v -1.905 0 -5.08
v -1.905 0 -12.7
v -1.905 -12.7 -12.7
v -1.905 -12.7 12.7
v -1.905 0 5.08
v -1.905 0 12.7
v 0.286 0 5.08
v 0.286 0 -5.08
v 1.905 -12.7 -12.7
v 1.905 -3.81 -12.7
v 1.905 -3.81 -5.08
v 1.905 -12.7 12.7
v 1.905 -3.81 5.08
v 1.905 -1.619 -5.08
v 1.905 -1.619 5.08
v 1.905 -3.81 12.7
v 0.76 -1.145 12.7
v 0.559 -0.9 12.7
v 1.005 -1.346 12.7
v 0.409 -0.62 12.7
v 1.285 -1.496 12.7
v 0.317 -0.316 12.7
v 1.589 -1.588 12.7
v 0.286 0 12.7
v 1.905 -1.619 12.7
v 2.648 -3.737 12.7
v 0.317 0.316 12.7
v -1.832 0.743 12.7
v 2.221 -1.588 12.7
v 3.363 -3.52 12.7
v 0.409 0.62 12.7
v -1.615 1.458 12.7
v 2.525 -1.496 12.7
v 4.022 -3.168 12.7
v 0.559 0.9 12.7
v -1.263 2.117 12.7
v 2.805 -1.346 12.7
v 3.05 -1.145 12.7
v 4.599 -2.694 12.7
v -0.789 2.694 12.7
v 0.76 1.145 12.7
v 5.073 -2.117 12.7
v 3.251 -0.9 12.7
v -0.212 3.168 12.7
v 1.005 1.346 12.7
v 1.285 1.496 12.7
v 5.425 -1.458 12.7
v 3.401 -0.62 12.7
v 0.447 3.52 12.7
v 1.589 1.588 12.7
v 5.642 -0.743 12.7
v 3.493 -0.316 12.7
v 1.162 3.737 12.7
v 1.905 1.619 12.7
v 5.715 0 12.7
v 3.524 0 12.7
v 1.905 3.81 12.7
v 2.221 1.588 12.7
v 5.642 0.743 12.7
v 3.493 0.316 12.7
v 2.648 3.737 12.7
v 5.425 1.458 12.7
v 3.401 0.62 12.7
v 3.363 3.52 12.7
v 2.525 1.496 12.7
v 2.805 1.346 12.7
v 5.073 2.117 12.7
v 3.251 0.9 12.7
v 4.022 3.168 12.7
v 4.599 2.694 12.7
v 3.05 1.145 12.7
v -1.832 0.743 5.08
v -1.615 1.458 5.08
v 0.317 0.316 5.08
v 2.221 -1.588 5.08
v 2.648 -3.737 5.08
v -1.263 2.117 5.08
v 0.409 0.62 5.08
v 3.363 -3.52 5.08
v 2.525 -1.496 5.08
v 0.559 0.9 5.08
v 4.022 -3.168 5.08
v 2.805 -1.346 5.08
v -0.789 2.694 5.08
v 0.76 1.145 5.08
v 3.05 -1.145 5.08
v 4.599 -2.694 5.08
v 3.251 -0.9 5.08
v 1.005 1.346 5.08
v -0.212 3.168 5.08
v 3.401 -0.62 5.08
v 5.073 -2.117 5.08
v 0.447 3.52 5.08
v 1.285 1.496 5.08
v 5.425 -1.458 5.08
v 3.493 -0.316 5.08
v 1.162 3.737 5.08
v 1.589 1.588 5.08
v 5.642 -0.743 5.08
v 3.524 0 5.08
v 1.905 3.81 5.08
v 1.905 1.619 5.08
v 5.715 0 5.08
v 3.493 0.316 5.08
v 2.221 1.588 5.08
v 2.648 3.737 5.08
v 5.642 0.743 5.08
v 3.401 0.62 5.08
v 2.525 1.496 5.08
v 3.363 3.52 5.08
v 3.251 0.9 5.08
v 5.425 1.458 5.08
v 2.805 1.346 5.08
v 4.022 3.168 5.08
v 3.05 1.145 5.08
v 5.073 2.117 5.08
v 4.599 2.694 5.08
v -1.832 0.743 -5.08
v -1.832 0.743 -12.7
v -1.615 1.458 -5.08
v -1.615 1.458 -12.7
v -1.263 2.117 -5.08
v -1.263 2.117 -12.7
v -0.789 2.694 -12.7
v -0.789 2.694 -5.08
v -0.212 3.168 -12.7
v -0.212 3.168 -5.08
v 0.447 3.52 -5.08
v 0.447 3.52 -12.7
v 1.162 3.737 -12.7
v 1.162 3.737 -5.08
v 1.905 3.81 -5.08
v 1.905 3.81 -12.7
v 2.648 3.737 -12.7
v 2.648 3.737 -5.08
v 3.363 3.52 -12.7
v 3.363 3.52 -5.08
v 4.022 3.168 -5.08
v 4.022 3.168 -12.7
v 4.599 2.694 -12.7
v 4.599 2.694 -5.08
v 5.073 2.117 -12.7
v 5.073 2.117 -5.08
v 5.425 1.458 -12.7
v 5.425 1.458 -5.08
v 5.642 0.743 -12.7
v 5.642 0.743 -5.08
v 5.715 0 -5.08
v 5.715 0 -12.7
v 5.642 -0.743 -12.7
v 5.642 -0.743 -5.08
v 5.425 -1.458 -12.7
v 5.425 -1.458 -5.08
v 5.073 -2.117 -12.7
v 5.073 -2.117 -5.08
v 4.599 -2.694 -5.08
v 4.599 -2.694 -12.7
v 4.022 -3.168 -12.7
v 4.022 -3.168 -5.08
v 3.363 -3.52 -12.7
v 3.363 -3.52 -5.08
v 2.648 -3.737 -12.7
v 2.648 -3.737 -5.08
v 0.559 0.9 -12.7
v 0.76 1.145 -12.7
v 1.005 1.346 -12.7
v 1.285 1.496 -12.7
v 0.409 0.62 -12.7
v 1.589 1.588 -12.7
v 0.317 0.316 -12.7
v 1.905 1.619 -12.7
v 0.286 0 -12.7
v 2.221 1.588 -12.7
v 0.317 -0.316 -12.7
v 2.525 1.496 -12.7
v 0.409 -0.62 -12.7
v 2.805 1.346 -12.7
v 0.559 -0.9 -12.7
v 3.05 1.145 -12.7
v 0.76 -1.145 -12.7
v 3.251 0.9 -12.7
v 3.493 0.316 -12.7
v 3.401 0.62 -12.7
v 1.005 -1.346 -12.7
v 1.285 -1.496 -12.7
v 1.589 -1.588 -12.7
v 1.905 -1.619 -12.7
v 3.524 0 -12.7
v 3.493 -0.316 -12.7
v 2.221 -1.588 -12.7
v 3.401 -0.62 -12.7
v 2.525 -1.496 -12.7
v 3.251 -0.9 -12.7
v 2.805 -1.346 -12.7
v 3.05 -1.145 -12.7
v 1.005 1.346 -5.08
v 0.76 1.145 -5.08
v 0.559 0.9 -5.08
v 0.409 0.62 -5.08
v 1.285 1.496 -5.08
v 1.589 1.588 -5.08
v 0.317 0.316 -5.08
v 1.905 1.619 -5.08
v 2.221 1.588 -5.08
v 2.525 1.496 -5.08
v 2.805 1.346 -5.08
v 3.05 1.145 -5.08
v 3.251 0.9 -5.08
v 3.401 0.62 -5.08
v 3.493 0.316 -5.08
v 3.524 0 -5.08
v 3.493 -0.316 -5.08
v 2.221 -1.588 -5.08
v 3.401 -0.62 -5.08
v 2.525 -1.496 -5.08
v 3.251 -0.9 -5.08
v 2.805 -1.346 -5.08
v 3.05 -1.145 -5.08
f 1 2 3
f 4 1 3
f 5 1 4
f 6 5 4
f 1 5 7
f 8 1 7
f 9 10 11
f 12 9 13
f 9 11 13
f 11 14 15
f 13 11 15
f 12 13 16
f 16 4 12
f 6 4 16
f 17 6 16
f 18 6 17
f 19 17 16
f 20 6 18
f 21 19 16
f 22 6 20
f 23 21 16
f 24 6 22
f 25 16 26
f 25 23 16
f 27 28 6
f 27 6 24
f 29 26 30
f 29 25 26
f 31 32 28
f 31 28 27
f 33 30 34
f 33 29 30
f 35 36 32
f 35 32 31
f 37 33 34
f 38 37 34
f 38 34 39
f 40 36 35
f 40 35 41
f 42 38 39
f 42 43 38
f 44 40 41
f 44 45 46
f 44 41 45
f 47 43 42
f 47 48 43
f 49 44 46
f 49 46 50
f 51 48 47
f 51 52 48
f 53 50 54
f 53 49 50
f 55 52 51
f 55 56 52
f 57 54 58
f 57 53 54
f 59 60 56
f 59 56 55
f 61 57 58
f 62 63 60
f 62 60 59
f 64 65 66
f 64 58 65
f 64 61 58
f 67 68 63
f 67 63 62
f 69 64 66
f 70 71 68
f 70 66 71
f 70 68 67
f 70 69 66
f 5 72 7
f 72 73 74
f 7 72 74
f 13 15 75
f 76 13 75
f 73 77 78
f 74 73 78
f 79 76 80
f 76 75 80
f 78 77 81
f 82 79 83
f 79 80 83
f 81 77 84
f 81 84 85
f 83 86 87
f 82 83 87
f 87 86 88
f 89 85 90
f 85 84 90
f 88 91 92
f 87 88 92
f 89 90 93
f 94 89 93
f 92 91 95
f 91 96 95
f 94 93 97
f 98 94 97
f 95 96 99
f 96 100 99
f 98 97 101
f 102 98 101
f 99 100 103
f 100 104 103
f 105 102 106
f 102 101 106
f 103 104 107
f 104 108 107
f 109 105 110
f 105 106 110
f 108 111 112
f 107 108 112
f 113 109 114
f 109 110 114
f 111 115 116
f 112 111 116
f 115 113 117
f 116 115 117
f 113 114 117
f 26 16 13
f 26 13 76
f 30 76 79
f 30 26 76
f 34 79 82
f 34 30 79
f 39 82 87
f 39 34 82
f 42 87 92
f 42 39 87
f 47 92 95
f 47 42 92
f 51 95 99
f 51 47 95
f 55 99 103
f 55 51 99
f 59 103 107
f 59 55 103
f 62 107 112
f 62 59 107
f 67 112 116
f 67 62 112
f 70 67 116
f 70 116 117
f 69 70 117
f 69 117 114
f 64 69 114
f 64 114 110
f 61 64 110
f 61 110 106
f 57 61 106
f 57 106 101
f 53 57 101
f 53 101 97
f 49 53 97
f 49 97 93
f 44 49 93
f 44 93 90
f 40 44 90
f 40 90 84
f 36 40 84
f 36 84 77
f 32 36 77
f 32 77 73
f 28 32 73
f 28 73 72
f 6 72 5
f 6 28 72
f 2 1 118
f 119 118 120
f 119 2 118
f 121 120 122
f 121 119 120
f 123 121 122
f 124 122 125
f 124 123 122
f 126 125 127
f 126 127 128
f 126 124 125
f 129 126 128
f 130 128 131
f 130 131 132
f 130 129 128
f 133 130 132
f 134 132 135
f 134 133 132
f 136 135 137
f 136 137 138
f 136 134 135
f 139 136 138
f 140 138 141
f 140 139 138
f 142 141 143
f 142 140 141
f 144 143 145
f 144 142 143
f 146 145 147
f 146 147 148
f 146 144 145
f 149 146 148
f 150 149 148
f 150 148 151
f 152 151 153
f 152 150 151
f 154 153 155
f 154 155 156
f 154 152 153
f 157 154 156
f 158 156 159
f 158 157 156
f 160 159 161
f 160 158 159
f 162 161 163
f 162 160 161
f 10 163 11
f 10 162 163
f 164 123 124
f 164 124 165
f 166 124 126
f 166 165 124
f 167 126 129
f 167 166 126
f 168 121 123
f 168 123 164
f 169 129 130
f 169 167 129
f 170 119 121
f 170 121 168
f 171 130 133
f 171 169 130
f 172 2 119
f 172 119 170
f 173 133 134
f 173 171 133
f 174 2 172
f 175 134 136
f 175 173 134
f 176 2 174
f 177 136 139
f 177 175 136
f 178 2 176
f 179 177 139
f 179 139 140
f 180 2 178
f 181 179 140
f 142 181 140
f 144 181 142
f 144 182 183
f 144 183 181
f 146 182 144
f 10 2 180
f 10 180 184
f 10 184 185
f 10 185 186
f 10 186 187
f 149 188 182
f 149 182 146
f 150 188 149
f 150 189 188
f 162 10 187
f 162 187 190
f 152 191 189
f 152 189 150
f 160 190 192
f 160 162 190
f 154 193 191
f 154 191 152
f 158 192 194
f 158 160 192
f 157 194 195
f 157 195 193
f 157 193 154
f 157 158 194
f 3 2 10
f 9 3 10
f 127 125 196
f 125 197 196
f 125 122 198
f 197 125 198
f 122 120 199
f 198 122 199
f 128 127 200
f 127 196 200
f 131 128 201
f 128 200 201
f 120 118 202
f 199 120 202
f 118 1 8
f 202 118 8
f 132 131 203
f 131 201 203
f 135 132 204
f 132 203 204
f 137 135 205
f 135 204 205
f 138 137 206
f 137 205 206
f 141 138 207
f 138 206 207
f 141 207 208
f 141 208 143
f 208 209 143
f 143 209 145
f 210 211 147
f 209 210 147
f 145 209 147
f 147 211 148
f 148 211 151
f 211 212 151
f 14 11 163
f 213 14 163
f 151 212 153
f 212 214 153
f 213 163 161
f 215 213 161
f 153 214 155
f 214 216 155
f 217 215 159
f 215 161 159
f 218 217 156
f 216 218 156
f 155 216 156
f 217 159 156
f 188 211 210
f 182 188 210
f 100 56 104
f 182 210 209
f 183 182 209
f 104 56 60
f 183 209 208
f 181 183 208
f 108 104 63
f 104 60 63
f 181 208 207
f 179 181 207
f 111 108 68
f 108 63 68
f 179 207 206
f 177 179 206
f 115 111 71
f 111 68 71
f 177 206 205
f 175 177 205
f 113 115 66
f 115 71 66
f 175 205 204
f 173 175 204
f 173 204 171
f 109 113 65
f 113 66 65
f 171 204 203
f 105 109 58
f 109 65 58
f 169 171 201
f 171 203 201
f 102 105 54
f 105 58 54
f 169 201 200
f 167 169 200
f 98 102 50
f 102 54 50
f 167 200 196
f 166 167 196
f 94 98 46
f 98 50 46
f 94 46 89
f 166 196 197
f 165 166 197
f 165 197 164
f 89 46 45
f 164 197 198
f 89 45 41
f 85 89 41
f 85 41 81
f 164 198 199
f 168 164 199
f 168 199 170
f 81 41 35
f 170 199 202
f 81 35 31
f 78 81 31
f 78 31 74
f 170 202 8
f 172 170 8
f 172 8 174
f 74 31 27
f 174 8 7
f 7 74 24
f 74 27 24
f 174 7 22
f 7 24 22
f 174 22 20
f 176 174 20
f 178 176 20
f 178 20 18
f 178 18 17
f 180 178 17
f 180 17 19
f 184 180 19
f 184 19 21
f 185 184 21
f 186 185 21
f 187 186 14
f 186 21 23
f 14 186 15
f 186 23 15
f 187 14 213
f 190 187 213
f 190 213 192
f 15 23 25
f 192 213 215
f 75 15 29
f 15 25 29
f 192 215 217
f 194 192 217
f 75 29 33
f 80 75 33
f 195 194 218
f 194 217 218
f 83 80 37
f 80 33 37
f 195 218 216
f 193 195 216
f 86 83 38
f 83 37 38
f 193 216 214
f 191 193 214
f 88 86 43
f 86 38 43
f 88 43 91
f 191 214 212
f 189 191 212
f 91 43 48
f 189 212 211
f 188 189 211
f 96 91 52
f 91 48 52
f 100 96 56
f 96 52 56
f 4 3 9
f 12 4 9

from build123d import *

# Parameters (mm, degrees)
F0_W     = 3.81
F0_H     = 25.4
F1_DEPTH = 12.7
F2_R     = 3.81
F3_DEPTH = 7.62
F5_DEPTH = 7.62
F6_DEPTH = 7.62
F7_R     = 1.61925
F8_DEPTH = 25.4


with BuildPart() as f1:
    # F0 (on Front) → F1 (new body)
    with BuildSketch(Plane.XZ):
        Rectangle(F0_W, F0_H)
    extrude(amount=F1_DEPTH)

    # F2 (on face) → F3 (join)
    with BuildSketch(Plane.XY.offset(12.7)):
        with Locations((1.905, 0)):
            Circle(F2_R)
    extrude(amount=-F3_DEPTH)

    # F2 (on face) → F5 (join)
    with BuildSketch(Plane.XY.offset(12.7)):
        with Locations((1.905, 0)):
            Circle(F2_R)
    extrude(amount=-F5_DEPTH)

    # F4 (on face) → F6 (join)
    with BuildSketch(Plane(origin=(0, 0, -12.7), x_dir=(1, 0, 0), z_dir=(0, 0, -1))):
        with BuildLine():
            Line((1.905, 0), (-1.905, 0))
            ThreePointArc((-1.905, 0), (1.905, -3.81), (5.715, 0))
            ThreePointArc((5.715, 0), (4.5990768363, 2.6940768363), (1.905, 3.81))
            Line((1.905, 3.81), (1.905, 0))
        make_face()
    extrude(amount=-F6_DEPTH)

    # F7 (on face) → F8 (cut)
    with BuildSketch(Plane.XY.offset(12.7)):
        with Locations((1.905, 0)):
            Circle(F7_R)
    extrude(amount=-F8_DEPTH, mode=Mode.SUBTRACT)


solid = f1.part
